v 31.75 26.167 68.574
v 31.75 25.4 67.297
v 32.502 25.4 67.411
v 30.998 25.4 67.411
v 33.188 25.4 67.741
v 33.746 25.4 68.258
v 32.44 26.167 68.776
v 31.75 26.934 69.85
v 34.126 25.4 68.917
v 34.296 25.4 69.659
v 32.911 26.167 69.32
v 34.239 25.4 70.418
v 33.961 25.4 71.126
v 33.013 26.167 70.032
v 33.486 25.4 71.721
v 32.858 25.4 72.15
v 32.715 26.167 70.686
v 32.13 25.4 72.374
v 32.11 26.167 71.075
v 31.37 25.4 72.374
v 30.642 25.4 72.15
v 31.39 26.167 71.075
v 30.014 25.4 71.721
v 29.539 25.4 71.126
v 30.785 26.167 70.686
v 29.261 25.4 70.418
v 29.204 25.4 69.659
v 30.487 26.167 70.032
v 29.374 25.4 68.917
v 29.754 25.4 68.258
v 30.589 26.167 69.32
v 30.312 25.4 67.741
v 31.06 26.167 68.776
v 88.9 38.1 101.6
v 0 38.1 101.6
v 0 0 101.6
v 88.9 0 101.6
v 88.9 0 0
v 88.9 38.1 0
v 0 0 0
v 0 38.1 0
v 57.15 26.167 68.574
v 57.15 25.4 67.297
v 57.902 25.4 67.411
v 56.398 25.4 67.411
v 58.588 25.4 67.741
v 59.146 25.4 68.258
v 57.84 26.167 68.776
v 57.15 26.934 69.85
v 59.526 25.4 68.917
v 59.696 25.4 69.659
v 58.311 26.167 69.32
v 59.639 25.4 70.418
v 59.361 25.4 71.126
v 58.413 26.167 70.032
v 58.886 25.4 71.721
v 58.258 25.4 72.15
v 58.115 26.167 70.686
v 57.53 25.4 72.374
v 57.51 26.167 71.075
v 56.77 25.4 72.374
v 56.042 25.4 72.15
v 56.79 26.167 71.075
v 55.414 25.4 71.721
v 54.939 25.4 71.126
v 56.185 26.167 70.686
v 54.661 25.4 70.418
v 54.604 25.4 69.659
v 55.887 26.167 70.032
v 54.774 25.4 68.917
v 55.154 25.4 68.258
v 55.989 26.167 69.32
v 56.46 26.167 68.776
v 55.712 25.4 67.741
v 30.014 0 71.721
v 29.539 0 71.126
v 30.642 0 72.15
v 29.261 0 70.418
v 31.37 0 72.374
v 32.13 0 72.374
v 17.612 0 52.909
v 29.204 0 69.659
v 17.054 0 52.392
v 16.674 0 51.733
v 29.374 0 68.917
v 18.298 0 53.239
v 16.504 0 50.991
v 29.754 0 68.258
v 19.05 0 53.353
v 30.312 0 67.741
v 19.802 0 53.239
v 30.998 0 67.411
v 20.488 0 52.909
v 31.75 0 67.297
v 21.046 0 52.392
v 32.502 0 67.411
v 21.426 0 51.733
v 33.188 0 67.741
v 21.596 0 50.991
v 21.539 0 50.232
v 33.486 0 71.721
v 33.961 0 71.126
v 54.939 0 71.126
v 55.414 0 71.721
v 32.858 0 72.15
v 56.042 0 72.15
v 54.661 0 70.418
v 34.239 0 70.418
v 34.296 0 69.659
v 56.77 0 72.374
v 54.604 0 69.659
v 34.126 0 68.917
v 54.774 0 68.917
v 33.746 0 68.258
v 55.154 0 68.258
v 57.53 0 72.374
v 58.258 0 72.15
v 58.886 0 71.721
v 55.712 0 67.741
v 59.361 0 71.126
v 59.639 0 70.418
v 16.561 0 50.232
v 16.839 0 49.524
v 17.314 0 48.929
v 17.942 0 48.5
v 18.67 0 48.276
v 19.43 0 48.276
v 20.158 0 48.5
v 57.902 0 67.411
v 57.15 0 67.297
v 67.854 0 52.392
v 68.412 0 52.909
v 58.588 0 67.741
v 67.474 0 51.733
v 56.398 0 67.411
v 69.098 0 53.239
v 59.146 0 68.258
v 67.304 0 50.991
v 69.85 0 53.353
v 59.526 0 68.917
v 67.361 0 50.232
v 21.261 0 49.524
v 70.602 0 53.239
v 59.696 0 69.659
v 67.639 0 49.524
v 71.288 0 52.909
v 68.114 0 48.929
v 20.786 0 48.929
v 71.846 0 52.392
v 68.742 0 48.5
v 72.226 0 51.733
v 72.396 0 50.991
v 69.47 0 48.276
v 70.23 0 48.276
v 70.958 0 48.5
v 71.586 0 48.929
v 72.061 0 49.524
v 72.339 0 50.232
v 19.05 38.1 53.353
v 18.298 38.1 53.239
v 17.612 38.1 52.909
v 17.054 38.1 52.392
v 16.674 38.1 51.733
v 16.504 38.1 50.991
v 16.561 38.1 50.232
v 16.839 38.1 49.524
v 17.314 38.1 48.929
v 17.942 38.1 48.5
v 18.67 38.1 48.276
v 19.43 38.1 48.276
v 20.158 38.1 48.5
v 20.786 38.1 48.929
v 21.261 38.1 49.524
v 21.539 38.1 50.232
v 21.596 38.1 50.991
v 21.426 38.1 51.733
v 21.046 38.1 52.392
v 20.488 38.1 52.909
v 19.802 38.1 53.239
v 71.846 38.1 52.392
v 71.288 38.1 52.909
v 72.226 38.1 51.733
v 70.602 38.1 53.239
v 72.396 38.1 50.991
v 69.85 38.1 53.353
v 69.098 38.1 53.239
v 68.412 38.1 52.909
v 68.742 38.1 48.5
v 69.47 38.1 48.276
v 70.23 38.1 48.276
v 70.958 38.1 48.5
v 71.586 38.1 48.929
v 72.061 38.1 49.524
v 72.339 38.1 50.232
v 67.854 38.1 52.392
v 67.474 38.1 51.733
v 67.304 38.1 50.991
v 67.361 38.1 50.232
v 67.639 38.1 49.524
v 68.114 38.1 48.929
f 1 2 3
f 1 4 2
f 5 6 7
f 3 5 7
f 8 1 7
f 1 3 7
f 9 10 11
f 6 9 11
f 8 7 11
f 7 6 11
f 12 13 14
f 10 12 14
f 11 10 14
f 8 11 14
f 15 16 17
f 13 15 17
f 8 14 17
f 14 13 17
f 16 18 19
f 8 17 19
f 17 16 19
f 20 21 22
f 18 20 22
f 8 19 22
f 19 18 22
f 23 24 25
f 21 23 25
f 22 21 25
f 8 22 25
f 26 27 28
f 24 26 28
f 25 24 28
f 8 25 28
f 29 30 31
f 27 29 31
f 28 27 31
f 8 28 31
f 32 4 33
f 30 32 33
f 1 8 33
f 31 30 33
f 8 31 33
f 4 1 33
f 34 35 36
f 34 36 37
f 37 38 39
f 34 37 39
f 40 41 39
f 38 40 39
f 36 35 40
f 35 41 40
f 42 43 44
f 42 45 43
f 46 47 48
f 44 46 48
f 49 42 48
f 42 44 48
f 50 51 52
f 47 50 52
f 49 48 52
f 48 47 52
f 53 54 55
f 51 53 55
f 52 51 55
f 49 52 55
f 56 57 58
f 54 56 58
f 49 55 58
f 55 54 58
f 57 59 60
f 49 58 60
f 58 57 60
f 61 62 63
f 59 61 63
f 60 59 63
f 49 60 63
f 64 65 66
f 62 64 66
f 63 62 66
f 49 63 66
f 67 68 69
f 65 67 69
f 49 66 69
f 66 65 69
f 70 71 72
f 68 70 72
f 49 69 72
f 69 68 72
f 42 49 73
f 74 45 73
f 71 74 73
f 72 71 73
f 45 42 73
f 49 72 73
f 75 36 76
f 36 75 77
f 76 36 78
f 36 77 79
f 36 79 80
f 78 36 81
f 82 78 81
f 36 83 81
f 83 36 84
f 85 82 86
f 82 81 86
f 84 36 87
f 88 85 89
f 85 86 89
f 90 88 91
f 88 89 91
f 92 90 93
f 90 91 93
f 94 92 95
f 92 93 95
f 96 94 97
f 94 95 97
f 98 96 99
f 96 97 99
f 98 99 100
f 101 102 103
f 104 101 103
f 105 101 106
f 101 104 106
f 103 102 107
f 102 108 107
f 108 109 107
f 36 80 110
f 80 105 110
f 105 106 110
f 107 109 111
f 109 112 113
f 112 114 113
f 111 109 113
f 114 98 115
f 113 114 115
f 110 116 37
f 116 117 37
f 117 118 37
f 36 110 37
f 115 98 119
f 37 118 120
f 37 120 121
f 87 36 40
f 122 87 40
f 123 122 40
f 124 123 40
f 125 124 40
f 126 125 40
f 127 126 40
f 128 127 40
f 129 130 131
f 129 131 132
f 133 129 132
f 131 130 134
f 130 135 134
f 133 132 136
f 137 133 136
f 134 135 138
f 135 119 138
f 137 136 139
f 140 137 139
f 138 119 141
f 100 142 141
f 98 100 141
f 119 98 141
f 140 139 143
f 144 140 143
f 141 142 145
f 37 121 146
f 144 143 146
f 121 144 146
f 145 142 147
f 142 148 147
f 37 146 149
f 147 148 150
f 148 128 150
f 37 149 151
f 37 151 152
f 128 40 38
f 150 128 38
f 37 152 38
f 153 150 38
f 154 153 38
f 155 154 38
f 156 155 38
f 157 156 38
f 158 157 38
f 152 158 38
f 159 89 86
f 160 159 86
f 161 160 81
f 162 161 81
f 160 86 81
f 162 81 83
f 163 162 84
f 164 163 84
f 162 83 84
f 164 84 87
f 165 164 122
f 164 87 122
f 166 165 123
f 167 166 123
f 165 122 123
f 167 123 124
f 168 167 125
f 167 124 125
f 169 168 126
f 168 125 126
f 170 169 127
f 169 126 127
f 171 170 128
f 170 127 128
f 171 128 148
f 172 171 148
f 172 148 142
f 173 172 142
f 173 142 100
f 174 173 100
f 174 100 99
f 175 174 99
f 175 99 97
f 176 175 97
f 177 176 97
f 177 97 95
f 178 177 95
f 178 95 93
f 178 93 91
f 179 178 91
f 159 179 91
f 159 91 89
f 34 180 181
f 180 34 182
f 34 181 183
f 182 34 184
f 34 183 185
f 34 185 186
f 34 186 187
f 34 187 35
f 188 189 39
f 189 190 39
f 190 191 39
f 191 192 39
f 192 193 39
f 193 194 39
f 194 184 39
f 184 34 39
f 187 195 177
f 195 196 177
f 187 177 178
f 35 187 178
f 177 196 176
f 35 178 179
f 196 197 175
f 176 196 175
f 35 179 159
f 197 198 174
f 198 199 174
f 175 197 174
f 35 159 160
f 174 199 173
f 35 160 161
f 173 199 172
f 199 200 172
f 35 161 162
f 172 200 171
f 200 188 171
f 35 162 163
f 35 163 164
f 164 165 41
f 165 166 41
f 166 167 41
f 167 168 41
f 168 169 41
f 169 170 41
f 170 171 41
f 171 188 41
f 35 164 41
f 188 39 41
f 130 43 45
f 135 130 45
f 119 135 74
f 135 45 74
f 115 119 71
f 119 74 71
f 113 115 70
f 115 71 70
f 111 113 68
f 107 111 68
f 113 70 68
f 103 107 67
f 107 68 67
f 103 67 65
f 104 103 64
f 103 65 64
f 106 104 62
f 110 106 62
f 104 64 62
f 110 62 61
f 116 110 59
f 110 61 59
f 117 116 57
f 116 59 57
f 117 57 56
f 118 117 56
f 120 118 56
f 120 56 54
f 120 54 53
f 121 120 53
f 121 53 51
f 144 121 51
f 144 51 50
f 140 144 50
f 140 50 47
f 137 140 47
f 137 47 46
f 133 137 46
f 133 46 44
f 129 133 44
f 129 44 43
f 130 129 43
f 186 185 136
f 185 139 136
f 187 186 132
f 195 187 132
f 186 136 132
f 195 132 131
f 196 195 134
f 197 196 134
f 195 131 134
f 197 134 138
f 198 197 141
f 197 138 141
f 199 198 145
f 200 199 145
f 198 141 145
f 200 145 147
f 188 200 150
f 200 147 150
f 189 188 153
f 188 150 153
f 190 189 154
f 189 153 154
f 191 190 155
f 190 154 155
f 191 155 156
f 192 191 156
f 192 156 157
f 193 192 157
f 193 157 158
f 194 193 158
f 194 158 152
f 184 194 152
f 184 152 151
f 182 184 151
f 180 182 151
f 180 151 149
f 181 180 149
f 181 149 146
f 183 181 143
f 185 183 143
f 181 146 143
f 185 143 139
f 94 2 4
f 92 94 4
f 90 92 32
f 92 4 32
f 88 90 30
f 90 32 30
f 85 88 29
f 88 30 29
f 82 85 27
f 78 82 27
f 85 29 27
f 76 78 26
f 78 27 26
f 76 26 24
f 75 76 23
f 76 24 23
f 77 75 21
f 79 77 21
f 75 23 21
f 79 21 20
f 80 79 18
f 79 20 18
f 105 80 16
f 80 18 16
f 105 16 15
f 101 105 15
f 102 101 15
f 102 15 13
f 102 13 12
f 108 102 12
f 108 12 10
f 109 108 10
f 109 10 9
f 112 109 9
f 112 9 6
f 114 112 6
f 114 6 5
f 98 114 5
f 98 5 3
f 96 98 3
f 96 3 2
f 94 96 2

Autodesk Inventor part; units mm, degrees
ref_plane "YZ Plane" through (0, 0, 0) normal (1, 0, 0) x (0, 1, 0)
ref_plane "XZ Plane" through (0, 0, 0) normal (0, 1, 0) x (-1, 0, 0)
ref_plane "XY Plane" through (0, 0, 0) normal (0, 0, 1) x (1, 0, 0)
sketch "Sketch1" plane through (0, 0, 0) normal (0, 0, 1) x (1, 0, 0)
  line L0 (0, 0) -> (88.9, 0)
  line L1 (88.9, 0) -> (88.9, 38.1)
  line L2 (88.9, 38.1) -> (0, 38.1)
  line L3 (0, 38.1) -> (0, 0)
  dimension "d0" = 88.9
  dimension "d1" = 38.1
extrude "Extrusion1" add sketch "Sketch1" along normal blind 101.6
sketch "Sketch3" plane through (0, 38.1, 0) normal (0, 1, 0) x (1, 0, 0)
  line L0 (88.9, 0) -> (0, 0) projected
  line L1 (88.9, -101.6) -> (0, -101.6) projected
  line L2 (88.9, 0) -> (88.9, -101.6) projected
  circle A0 centre (69.85, -50.8) radius 4.3006
  line L3 (44.45, 0) -> (44.45, -101.6) construction
  circle A1 centre (19.05, -50.8) radius 4.3006
  dimension "d4" = 19.05
hole "Hole1" at (19.05, 38.1, 50.8) at (69.85, 38.1, 50.8) direction (0, -1, 0) diameter 5.1054 end through all clearance for "Flat Head Machine Screw (82)" size "#10" standard "Ansi Unified Screw Threads"
sketch "Sketch4" plane through (0, 0, 0) normal (0, -1, 0) x (1, 0, 0)
  circle A0 centre (19.05, 50.8) radius 2.5527 projected
  circle A1 centre (69.85, 50.8) radius 2.5527 projected
  line L0 (0, 0) -> (88.9, 0) projected
  line L1 (0, 101.6) -> (88.9, 101.6) projected
  line L2 (44.45, 101.6) -> (44.45, 0) construction
  circle A2 centre (31.75, 69.85) radius 5.9334
  line L3 (19.05, 50.8) -> (69.85, 50.8) construction
  circle A3 centre (57.15, 69.85) radius 5.9334
  point P0 (31.75, 31.75)
  point P1 (57.15, 31.75)
  dimension "d12" = 19.05
  dimension "d13" = 12.7
hole "Hole3" at (31.75, 0, 69.85) at (57.15, 0, 69.85) direction (0, 1, 0) diameter 5.1054 depth 25.4 tip angle 118 clearance for "Flat Head Machine Screw (82)" size "#10" standard "Ansi Unified Screw Threads"
properties part number "hubjig_blocks" material "Wood (Cherry)"
